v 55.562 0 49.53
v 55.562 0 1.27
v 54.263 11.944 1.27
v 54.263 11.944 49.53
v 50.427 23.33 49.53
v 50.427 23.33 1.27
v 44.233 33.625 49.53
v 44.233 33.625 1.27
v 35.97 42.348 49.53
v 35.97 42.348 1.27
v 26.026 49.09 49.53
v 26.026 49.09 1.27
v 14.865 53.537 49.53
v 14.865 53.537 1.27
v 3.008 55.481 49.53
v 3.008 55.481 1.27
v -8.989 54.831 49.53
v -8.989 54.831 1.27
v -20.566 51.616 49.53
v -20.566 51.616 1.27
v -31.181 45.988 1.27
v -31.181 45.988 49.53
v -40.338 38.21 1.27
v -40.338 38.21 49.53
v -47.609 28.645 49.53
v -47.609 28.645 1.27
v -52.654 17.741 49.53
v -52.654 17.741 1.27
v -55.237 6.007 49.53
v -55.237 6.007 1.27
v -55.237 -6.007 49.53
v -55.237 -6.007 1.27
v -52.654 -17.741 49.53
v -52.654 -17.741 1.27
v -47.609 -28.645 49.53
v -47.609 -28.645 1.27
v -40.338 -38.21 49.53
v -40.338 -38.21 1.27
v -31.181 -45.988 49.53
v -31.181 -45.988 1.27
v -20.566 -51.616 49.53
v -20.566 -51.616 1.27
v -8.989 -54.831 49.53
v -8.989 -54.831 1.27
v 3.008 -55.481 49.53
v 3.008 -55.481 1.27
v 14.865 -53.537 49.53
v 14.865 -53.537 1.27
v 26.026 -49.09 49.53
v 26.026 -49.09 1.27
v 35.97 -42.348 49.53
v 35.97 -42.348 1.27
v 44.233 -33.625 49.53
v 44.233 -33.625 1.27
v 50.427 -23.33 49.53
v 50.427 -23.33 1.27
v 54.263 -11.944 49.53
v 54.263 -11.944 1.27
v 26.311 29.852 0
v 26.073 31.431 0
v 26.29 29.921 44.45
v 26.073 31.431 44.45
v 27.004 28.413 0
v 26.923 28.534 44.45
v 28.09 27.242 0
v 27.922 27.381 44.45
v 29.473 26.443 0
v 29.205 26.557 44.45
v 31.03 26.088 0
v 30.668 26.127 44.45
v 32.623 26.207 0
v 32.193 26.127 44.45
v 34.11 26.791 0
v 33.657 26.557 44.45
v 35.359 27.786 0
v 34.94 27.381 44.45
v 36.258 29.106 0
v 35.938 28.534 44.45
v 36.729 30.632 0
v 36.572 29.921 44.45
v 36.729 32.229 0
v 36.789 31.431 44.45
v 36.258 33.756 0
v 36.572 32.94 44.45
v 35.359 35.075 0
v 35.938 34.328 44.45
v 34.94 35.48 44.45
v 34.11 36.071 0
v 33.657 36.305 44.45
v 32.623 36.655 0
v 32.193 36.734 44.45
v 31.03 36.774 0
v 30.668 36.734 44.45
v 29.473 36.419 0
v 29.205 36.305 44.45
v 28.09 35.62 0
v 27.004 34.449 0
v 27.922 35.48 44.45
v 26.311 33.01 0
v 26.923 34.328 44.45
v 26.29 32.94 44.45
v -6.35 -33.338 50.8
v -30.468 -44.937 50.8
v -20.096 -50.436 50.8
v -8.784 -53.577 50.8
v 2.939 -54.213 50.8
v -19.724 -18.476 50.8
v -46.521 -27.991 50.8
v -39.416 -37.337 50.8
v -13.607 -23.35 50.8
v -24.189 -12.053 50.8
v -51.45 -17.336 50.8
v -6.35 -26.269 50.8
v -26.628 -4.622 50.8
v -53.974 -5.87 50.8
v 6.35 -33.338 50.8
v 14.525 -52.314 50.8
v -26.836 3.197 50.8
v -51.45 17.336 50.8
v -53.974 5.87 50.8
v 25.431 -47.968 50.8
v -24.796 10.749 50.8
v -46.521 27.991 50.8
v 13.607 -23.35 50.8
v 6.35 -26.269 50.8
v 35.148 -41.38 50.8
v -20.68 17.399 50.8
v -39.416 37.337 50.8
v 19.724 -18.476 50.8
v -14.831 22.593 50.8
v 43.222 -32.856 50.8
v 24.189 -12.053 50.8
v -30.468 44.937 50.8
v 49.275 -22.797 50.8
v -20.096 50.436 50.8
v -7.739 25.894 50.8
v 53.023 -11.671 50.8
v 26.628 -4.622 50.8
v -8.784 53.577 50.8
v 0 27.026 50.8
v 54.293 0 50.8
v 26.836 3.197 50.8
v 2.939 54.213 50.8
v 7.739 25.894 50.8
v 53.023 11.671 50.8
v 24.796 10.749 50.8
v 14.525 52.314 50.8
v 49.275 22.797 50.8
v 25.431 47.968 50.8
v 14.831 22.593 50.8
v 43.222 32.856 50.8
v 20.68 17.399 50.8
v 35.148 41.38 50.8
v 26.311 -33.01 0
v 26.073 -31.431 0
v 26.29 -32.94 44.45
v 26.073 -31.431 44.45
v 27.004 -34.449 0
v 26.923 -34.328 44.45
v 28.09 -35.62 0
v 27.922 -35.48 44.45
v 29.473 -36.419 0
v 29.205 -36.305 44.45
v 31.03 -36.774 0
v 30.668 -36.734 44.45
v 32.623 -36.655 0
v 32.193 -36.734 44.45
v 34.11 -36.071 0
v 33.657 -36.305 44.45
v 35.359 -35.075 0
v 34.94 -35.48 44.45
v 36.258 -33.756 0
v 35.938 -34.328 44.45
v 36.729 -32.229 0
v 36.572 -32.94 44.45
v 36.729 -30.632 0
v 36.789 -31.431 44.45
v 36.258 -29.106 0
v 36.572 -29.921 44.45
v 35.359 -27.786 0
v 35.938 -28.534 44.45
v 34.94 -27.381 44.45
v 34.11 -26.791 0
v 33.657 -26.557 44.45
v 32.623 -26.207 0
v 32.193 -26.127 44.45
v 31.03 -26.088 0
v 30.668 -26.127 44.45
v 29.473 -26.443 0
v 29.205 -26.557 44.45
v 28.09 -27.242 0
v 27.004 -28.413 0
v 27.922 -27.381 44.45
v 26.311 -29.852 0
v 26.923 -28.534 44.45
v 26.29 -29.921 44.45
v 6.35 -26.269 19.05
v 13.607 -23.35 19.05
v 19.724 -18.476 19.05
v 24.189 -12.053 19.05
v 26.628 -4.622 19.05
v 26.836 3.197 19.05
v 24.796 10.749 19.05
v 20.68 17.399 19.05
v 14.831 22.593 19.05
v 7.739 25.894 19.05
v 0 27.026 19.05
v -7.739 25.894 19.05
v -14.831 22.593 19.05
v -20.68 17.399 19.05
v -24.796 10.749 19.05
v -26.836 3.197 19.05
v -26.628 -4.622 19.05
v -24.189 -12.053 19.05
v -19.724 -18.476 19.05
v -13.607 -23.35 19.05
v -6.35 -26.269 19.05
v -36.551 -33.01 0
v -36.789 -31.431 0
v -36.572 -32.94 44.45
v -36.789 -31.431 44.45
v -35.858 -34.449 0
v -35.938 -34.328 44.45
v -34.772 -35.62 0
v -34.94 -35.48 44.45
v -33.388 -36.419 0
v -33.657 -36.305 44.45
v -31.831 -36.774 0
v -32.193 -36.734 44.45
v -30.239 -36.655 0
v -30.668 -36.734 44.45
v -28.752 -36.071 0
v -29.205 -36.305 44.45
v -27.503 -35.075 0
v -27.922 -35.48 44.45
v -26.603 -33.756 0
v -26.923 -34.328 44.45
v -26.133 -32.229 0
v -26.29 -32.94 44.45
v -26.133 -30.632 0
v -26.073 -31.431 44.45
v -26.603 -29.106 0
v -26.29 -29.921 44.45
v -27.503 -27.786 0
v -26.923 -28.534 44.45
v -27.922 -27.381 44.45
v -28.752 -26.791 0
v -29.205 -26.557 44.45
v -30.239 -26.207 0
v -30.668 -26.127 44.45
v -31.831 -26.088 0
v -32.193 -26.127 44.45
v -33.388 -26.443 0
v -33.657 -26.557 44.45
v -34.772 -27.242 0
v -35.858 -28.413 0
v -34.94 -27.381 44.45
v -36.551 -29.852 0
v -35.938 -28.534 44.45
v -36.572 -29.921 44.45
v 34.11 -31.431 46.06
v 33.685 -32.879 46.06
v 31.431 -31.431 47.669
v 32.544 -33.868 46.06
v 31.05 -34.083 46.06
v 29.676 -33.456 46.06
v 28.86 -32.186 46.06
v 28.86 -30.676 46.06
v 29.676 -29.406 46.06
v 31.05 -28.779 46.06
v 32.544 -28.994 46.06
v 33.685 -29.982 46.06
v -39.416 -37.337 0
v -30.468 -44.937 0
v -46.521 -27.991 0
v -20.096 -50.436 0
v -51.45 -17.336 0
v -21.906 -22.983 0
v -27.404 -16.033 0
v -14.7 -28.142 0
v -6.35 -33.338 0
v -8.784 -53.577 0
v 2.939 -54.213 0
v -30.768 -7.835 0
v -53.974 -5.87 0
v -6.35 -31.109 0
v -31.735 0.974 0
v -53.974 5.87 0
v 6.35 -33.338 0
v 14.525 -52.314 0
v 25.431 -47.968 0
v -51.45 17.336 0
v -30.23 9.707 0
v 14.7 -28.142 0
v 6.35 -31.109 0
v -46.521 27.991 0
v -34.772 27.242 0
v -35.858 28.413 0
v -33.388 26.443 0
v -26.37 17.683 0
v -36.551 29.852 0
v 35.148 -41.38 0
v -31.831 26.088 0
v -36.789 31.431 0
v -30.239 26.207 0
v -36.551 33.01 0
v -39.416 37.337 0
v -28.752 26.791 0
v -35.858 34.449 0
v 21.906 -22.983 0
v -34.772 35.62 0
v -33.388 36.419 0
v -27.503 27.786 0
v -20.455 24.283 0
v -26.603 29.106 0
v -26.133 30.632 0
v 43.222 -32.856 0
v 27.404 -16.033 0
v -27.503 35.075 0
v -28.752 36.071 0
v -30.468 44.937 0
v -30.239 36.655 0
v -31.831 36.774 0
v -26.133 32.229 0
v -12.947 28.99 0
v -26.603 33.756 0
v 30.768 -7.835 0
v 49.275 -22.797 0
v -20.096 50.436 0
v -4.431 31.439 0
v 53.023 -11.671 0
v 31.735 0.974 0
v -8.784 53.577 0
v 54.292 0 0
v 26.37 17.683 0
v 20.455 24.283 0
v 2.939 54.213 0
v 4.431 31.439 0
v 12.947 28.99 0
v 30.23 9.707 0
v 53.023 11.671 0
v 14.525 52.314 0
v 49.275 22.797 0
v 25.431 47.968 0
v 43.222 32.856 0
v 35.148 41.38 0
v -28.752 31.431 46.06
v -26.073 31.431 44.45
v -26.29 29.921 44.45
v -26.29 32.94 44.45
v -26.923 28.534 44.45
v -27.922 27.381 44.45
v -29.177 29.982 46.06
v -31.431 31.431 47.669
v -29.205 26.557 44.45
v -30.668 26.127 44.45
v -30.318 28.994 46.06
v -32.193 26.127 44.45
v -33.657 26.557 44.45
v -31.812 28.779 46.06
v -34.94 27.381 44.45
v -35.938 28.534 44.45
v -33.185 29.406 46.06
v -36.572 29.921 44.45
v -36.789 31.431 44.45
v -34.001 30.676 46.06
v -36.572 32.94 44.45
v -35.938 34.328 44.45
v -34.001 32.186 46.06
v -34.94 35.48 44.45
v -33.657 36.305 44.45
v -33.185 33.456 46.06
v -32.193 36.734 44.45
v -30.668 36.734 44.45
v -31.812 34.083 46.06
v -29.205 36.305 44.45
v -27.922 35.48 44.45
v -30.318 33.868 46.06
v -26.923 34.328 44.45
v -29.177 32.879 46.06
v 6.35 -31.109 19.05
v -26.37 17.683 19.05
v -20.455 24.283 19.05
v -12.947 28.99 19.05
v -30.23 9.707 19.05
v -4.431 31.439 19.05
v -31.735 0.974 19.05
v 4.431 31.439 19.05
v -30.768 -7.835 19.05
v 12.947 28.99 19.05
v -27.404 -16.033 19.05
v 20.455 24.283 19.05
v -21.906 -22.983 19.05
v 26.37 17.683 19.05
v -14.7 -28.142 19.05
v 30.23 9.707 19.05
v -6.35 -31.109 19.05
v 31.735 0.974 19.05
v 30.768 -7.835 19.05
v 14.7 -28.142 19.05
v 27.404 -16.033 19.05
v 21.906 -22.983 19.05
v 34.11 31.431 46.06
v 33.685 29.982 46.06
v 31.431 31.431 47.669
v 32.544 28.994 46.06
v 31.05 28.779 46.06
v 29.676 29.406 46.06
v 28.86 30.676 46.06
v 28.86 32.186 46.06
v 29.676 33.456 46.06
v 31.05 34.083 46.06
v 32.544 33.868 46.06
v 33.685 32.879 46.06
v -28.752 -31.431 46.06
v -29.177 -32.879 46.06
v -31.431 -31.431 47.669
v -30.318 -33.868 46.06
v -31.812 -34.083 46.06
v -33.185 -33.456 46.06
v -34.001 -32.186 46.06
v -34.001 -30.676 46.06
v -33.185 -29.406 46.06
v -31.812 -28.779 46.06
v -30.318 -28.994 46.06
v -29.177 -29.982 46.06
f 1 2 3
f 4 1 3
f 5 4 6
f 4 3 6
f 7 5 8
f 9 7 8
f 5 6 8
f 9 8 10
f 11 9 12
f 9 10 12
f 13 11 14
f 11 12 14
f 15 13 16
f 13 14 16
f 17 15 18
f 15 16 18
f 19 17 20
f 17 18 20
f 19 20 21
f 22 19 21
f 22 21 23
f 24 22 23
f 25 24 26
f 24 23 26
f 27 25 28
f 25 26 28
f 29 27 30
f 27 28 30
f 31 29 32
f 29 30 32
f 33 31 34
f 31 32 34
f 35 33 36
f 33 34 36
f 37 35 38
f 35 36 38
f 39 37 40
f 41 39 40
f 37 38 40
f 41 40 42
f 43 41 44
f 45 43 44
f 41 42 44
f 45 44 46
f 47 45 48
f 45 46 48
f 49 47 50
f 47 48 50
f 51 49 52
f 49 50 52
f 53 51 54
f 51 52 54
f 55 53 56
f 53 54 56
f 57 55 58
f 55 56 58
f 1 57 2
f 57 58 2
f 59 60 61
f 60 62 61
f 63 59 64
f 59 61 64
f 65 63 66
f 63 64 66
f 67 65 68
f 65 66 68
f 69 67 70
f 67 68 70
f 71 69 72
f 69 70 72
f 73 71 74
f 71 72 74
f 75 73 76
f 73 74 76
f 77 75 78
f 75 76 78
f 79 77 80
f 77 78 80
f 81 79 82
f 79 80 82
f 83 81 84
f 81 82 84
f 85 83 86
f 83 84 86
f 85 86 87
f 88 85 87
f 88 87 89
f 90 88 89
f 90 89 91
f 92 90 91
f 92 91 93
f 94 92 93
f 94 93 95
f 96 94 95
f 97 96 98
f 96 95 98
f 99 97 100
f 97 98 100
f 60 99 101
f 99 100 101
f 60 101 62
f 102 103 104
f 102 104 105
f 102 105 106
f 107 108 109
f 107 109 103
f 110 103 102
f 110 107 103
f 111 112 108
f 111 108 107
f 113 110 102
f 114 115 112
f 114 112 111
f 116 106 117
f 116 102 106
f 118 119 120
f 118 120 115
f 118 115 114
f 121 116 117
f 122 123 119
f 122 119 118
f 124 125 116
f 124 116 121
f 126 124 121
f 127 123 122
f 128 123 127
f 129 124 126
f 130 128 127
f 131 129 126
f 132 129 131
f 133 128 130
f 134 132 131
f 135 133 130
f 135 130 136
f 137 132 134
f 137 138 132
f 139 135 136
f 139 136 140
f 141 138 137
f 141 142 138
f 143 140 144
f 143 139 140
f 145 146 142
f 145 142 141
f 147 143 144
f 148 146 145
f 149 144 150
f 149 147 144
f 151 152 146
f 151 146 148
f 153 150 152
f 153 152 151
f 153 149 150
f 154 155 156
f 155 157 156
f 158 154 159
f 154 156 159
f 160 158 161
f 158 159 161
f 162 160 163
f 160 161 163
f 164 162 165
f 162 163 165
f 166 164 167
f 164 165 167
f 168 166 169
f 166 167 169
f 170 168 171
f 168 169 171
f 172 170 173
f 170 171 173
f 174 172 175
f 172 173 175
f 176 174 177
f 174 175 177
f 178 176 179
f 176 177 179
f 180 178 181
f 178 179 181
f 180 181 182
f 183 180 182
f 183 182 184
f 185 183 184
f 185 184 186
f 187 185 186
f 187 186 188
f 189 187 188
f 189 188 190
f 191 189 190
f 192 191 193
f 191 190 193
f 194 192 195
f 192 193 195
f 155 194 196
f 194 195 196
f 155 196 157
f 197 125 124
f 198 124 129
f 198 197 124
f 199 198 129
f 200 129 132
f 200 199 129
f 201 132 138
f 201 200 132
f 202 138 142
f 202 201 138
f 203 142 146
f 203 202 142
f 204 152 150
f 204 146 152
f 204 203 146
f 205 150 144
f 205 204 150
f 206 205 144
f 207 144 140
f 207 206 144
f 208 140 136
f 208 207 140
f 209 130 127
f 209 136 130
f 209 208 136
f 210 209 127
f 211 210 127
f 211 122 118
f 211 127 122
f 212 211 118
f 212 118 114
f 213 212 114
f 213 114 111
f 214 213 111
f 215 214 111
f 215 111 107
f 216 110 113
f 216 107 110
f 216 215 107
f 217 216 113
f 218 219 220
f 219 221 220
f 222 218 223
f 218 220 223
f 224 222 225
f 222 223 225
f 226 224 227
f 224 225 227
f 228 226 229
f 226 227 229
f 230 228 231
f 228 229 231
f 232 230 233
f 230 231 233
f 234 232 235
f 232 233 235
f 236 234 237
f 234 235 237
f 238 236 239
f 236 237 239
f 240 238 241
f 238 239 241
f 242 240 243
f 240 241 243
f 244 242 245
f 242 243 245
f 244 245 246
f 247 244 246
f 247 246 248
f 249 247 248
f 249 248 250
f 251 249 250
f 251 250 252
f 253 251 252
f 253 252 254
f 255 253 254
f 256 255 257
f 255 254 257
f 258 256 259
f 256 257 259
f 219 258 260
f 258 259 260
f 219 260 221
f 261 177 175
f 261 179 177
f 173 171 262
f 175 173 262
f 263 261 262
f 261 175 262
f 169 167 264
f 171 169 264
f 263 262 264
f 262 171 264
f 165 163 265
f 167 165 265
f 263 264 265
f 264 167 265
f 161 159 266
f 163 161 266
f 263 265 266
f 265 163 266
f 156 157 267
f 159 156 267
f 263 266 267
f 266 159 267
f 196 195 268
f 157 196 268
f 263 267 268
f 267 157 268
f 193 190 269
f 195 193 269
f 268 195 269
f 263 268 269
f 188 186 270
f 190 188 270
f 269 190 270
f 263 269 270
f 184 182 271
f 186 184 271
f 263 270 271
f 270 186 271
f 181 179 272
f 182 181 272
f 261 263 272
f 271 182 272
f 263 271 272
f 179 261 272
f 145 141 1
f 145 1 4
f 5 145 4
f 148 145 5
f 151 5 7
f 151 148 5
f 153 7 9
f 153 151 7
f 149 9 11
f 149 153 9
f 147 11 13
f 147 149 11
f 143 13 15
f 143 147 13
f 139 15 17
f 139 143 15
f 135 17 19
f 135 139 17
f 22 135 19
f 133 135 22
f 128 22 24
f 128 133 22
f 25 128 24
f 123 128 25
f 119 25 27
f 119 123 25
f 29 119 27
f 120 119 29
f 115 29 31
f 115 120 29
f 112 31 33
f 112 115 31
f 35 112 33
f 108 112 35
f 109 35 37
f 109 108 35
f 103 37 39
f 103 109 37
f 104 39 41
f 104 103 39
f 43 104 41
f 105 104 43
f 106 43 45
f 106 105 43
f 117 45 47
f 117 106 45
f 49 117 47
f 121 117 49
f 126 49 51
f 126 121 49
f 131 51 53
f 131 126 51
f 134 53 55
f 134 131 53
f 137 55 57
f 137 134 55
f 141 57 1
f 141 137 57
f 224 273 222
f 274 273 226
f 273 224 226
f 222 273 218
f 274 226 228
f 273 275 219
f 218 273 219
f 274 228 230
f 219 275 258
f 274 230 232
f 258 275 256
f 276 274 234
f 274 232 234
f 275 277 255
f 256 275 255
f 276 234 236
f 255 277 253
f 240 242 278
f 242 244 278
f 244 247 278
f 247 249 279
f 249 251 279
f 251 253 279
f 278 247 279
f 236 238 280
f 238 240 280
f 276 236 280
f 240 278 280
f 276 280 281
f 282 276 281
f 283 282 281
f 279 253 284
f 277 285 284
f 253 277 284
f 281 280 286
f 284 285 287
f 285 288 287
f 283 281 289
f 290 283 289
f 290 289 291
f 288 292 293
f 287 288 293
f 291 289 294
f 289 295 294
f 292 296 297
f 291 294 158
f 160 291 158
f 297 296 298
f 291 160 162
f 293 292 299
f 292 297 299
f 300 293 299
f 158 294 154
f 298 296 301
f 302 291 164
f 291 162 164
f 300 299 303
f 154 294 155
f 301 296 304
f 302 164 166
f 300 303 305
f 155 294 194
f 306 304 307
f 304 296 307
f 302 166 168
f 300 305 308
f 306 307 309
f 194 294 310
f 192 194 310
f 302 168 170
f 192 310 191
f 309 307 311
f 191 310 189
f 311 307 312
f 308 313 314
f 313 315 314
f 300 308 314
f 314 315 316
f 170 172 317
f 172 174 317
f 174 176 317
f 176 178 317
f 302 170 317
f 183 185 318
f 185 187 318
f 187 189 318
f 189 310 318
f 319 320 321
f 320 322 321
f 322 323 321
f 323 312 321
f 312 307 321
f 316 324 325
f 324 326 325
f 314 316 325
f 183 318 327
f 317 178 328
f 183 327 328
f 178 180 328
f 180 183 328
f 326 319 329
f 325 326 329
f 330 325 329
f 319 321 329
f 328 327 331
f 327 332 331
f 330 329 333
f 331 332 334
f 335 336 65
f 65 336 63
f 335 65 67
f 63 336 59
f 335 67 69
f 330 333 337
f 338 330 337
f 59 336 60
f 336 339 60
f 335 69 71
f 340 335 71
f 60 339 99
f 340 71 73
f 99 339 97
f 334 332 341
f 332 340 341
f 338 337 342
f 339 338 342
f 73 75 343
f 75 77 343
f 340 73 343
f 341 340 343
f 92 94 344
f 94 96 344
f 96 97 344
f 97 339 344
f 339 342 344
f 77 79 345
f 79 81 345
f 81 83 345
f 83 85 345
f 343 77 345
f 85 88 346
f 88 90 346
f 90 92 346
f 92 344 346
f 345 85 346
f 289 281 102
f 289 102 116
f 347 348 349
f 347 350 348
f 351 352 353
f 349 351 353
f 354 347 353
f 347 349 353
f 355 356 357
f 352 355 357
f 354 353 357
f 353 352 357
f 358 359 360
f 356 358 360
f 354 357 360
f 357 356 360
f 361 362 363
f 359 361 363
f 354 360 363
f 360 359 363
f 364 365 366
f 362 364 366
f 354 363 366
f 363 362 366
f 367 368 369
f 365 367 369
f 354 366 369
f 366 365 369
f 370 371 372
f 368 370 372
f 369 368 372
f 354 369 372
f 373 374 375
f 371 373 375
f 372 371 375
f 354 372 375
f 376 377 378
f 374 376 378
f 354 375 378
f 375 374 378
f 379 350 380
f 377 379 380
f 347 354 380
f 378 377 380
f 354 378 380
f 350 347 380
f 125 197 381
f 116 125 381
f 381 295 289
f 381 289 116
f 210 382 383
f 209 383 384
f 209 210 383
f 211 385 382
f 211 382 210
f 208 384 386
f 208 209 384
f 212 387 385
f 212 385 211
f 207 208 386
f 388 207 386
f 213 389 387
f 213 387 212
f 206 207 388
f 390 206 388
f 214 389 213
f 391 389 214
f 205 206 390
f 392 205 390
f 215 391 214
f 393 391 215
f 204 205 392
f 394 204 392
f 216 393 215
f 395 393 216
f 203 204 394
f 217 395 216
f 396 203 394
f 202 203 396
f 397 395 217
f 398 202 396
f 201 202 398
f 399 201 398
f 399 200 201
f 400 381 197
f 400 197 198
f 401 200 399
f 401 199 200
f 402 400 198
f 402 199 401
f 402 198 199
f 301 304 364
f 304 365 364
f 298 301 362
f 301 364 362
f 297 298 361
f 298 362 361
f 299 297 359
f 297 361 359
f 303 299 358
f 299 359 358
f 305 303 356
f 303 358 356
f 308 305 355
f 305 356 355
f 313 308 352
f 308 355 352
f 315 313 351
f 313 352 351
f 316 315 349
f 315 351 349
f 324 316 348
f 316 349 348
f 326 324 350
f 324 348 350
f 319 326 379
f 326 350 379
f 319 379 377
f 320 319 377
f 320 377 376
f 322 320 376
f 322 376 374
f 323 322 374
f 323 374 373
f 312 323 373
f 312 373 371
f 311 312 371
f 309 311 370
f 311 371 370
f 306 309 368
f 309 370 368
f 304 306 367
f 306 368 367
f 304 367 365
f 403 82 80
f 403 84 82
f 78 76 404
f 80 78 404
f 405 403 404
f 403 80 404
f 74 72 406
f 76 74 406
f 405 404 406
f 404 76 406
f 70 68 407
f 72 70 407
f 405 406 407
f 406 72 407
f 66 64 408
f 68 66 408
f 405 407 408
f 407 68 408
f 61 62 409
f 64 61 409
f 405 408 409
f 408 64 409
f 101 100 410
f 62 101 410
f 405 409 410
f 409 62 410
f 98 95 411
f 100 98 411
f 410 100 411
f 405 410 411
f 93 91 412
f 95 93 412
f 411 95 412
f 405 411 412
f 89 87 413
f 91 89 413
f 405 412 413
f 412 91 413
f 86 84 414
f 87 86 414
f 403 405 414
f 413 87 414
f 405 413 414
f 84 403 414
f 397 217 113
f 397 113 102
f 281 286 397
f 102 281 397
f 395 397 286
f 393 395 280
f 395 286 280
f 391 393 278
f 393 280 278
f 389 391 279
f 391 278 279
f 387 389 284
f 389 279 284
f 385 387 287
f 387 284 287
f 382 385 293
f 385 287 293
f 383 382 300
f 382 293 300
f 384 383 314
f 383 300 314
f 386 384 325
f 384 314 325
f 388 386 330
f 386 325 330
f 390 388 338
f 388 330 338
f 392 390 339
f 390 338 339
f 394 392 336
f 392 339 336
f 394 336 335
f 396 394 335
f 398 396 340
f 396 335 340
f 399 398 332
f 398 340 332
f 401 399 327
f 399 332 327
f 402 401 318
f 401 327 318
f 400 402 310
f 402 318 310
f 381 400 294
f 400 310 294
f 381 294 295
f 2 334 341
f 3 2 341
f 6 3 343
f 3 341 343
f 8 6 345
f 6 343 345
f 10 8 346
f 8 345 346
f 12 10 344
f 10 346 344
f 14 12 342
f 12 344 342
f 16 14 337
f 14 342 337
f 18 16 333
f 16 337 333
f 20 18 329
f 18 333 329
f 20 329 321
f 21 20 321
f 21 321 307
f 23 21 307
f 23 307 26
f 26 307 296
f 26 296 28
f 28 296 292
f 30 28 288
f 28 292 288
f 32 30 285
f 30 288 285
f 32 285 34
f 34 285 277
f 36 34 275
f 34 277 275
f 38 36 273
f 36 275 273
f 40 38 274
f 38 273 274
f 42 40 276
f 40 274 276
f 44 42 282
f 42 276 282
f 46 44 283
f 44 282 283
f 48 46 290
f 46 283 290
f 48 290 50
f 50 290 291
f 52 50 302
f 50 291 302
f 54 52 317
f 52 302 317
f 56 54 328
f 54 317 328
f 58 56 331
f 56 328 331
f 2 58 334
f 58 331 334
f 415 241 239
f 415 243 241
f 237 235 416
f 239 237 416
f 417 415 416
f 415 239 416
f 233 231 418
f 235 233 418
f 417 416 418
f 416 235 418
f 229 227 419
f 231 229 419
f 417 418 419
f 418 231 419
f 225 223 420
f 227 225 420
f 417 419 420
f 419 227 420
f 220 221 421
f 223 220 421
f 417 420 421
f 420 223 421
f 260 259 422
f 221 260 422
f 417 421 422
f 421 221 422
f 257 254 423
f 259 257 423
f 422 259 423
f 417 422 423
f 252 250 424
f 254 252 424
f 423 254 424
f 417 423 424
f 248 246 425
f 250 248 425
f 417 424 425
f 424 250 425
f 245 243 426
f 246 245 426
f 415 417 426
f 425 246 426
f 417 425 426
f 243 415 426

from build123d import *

# Parameters (mm, degrees)
F0_R     = 55.5625
F0_R_2   = 27.0256
F1_DEPTH = 50.8
F3_R     = 31.75
F4_DEPTH = 19.05
F5_W     = 12.7
F5_H     = 33.3375
F6_DEPTH = 50.801
F7_SIZE  = 1.27
F8_D     = 10.71626
F8_DEPTH = 44.45
F8_TIP   = 3.2194893086


with BuildPart() as f1:
    # F0 (on Top) → F1 (new body)
    with BuildSketch(Plane.XY):
        Circle(F0_R)
        Circle(F0_R_2, mode=Mode.SUBTRACT)
    extrude(amount=F1_DEPTH)

    # F3 (on face) → F4 (cut)
    with BuildSketch(Plane(origin=(0, 0, 0), x_dir=(1, 0, 0), z_dir=(0, 0, -1))):
        Circle(F3_R)
    extrude(amount=-F4_DEPTH, mode=Mode.SUBTRACT)

    # F5 (on face) → F6 (cut, through all)
    with BuildSketch(Plane(origin=(0, 0, 0), x_dir=(1, 0, 0), z_dir=(0, 0, -1))):
        with Locations((0, 16.66875)):
            Rectangle(F5_W, F5_H)
    extrude(amount=-F6_DEPTH, mode=Mode.SUBTRACT)

    # F7
    f7_edges = [f1.edges().sort_by_distance(p)[0] for p in [
        (-55.5625, 0, 50.8),
        (-55.5625, 0, 0),
    ]]
    chamfer(f7_edges, length=F7_SIZE)

    # F8
    with Locations(Plane(origin=(0, 0, 0), x_dir=(1, 0, 0), z_dir=(0, 0, -1))):
        with Locations((-31.4308964237, -31.4308964237), (-31.4308964237, 31.4308964237), (31.4308964237, 31.4308964237), (31.4308964237, -31.4308964237)):
            Hole(F8_D / 2, depth=F8_DEPTH)
            with Locations((0, 0, -(F8_DEPTH + F8_TIP / 2))):  # 118° drill point
                Cone(0, F8_D / 2, F8_TIP, mode=Mode.SUBTRACT)


solid = f1.part
